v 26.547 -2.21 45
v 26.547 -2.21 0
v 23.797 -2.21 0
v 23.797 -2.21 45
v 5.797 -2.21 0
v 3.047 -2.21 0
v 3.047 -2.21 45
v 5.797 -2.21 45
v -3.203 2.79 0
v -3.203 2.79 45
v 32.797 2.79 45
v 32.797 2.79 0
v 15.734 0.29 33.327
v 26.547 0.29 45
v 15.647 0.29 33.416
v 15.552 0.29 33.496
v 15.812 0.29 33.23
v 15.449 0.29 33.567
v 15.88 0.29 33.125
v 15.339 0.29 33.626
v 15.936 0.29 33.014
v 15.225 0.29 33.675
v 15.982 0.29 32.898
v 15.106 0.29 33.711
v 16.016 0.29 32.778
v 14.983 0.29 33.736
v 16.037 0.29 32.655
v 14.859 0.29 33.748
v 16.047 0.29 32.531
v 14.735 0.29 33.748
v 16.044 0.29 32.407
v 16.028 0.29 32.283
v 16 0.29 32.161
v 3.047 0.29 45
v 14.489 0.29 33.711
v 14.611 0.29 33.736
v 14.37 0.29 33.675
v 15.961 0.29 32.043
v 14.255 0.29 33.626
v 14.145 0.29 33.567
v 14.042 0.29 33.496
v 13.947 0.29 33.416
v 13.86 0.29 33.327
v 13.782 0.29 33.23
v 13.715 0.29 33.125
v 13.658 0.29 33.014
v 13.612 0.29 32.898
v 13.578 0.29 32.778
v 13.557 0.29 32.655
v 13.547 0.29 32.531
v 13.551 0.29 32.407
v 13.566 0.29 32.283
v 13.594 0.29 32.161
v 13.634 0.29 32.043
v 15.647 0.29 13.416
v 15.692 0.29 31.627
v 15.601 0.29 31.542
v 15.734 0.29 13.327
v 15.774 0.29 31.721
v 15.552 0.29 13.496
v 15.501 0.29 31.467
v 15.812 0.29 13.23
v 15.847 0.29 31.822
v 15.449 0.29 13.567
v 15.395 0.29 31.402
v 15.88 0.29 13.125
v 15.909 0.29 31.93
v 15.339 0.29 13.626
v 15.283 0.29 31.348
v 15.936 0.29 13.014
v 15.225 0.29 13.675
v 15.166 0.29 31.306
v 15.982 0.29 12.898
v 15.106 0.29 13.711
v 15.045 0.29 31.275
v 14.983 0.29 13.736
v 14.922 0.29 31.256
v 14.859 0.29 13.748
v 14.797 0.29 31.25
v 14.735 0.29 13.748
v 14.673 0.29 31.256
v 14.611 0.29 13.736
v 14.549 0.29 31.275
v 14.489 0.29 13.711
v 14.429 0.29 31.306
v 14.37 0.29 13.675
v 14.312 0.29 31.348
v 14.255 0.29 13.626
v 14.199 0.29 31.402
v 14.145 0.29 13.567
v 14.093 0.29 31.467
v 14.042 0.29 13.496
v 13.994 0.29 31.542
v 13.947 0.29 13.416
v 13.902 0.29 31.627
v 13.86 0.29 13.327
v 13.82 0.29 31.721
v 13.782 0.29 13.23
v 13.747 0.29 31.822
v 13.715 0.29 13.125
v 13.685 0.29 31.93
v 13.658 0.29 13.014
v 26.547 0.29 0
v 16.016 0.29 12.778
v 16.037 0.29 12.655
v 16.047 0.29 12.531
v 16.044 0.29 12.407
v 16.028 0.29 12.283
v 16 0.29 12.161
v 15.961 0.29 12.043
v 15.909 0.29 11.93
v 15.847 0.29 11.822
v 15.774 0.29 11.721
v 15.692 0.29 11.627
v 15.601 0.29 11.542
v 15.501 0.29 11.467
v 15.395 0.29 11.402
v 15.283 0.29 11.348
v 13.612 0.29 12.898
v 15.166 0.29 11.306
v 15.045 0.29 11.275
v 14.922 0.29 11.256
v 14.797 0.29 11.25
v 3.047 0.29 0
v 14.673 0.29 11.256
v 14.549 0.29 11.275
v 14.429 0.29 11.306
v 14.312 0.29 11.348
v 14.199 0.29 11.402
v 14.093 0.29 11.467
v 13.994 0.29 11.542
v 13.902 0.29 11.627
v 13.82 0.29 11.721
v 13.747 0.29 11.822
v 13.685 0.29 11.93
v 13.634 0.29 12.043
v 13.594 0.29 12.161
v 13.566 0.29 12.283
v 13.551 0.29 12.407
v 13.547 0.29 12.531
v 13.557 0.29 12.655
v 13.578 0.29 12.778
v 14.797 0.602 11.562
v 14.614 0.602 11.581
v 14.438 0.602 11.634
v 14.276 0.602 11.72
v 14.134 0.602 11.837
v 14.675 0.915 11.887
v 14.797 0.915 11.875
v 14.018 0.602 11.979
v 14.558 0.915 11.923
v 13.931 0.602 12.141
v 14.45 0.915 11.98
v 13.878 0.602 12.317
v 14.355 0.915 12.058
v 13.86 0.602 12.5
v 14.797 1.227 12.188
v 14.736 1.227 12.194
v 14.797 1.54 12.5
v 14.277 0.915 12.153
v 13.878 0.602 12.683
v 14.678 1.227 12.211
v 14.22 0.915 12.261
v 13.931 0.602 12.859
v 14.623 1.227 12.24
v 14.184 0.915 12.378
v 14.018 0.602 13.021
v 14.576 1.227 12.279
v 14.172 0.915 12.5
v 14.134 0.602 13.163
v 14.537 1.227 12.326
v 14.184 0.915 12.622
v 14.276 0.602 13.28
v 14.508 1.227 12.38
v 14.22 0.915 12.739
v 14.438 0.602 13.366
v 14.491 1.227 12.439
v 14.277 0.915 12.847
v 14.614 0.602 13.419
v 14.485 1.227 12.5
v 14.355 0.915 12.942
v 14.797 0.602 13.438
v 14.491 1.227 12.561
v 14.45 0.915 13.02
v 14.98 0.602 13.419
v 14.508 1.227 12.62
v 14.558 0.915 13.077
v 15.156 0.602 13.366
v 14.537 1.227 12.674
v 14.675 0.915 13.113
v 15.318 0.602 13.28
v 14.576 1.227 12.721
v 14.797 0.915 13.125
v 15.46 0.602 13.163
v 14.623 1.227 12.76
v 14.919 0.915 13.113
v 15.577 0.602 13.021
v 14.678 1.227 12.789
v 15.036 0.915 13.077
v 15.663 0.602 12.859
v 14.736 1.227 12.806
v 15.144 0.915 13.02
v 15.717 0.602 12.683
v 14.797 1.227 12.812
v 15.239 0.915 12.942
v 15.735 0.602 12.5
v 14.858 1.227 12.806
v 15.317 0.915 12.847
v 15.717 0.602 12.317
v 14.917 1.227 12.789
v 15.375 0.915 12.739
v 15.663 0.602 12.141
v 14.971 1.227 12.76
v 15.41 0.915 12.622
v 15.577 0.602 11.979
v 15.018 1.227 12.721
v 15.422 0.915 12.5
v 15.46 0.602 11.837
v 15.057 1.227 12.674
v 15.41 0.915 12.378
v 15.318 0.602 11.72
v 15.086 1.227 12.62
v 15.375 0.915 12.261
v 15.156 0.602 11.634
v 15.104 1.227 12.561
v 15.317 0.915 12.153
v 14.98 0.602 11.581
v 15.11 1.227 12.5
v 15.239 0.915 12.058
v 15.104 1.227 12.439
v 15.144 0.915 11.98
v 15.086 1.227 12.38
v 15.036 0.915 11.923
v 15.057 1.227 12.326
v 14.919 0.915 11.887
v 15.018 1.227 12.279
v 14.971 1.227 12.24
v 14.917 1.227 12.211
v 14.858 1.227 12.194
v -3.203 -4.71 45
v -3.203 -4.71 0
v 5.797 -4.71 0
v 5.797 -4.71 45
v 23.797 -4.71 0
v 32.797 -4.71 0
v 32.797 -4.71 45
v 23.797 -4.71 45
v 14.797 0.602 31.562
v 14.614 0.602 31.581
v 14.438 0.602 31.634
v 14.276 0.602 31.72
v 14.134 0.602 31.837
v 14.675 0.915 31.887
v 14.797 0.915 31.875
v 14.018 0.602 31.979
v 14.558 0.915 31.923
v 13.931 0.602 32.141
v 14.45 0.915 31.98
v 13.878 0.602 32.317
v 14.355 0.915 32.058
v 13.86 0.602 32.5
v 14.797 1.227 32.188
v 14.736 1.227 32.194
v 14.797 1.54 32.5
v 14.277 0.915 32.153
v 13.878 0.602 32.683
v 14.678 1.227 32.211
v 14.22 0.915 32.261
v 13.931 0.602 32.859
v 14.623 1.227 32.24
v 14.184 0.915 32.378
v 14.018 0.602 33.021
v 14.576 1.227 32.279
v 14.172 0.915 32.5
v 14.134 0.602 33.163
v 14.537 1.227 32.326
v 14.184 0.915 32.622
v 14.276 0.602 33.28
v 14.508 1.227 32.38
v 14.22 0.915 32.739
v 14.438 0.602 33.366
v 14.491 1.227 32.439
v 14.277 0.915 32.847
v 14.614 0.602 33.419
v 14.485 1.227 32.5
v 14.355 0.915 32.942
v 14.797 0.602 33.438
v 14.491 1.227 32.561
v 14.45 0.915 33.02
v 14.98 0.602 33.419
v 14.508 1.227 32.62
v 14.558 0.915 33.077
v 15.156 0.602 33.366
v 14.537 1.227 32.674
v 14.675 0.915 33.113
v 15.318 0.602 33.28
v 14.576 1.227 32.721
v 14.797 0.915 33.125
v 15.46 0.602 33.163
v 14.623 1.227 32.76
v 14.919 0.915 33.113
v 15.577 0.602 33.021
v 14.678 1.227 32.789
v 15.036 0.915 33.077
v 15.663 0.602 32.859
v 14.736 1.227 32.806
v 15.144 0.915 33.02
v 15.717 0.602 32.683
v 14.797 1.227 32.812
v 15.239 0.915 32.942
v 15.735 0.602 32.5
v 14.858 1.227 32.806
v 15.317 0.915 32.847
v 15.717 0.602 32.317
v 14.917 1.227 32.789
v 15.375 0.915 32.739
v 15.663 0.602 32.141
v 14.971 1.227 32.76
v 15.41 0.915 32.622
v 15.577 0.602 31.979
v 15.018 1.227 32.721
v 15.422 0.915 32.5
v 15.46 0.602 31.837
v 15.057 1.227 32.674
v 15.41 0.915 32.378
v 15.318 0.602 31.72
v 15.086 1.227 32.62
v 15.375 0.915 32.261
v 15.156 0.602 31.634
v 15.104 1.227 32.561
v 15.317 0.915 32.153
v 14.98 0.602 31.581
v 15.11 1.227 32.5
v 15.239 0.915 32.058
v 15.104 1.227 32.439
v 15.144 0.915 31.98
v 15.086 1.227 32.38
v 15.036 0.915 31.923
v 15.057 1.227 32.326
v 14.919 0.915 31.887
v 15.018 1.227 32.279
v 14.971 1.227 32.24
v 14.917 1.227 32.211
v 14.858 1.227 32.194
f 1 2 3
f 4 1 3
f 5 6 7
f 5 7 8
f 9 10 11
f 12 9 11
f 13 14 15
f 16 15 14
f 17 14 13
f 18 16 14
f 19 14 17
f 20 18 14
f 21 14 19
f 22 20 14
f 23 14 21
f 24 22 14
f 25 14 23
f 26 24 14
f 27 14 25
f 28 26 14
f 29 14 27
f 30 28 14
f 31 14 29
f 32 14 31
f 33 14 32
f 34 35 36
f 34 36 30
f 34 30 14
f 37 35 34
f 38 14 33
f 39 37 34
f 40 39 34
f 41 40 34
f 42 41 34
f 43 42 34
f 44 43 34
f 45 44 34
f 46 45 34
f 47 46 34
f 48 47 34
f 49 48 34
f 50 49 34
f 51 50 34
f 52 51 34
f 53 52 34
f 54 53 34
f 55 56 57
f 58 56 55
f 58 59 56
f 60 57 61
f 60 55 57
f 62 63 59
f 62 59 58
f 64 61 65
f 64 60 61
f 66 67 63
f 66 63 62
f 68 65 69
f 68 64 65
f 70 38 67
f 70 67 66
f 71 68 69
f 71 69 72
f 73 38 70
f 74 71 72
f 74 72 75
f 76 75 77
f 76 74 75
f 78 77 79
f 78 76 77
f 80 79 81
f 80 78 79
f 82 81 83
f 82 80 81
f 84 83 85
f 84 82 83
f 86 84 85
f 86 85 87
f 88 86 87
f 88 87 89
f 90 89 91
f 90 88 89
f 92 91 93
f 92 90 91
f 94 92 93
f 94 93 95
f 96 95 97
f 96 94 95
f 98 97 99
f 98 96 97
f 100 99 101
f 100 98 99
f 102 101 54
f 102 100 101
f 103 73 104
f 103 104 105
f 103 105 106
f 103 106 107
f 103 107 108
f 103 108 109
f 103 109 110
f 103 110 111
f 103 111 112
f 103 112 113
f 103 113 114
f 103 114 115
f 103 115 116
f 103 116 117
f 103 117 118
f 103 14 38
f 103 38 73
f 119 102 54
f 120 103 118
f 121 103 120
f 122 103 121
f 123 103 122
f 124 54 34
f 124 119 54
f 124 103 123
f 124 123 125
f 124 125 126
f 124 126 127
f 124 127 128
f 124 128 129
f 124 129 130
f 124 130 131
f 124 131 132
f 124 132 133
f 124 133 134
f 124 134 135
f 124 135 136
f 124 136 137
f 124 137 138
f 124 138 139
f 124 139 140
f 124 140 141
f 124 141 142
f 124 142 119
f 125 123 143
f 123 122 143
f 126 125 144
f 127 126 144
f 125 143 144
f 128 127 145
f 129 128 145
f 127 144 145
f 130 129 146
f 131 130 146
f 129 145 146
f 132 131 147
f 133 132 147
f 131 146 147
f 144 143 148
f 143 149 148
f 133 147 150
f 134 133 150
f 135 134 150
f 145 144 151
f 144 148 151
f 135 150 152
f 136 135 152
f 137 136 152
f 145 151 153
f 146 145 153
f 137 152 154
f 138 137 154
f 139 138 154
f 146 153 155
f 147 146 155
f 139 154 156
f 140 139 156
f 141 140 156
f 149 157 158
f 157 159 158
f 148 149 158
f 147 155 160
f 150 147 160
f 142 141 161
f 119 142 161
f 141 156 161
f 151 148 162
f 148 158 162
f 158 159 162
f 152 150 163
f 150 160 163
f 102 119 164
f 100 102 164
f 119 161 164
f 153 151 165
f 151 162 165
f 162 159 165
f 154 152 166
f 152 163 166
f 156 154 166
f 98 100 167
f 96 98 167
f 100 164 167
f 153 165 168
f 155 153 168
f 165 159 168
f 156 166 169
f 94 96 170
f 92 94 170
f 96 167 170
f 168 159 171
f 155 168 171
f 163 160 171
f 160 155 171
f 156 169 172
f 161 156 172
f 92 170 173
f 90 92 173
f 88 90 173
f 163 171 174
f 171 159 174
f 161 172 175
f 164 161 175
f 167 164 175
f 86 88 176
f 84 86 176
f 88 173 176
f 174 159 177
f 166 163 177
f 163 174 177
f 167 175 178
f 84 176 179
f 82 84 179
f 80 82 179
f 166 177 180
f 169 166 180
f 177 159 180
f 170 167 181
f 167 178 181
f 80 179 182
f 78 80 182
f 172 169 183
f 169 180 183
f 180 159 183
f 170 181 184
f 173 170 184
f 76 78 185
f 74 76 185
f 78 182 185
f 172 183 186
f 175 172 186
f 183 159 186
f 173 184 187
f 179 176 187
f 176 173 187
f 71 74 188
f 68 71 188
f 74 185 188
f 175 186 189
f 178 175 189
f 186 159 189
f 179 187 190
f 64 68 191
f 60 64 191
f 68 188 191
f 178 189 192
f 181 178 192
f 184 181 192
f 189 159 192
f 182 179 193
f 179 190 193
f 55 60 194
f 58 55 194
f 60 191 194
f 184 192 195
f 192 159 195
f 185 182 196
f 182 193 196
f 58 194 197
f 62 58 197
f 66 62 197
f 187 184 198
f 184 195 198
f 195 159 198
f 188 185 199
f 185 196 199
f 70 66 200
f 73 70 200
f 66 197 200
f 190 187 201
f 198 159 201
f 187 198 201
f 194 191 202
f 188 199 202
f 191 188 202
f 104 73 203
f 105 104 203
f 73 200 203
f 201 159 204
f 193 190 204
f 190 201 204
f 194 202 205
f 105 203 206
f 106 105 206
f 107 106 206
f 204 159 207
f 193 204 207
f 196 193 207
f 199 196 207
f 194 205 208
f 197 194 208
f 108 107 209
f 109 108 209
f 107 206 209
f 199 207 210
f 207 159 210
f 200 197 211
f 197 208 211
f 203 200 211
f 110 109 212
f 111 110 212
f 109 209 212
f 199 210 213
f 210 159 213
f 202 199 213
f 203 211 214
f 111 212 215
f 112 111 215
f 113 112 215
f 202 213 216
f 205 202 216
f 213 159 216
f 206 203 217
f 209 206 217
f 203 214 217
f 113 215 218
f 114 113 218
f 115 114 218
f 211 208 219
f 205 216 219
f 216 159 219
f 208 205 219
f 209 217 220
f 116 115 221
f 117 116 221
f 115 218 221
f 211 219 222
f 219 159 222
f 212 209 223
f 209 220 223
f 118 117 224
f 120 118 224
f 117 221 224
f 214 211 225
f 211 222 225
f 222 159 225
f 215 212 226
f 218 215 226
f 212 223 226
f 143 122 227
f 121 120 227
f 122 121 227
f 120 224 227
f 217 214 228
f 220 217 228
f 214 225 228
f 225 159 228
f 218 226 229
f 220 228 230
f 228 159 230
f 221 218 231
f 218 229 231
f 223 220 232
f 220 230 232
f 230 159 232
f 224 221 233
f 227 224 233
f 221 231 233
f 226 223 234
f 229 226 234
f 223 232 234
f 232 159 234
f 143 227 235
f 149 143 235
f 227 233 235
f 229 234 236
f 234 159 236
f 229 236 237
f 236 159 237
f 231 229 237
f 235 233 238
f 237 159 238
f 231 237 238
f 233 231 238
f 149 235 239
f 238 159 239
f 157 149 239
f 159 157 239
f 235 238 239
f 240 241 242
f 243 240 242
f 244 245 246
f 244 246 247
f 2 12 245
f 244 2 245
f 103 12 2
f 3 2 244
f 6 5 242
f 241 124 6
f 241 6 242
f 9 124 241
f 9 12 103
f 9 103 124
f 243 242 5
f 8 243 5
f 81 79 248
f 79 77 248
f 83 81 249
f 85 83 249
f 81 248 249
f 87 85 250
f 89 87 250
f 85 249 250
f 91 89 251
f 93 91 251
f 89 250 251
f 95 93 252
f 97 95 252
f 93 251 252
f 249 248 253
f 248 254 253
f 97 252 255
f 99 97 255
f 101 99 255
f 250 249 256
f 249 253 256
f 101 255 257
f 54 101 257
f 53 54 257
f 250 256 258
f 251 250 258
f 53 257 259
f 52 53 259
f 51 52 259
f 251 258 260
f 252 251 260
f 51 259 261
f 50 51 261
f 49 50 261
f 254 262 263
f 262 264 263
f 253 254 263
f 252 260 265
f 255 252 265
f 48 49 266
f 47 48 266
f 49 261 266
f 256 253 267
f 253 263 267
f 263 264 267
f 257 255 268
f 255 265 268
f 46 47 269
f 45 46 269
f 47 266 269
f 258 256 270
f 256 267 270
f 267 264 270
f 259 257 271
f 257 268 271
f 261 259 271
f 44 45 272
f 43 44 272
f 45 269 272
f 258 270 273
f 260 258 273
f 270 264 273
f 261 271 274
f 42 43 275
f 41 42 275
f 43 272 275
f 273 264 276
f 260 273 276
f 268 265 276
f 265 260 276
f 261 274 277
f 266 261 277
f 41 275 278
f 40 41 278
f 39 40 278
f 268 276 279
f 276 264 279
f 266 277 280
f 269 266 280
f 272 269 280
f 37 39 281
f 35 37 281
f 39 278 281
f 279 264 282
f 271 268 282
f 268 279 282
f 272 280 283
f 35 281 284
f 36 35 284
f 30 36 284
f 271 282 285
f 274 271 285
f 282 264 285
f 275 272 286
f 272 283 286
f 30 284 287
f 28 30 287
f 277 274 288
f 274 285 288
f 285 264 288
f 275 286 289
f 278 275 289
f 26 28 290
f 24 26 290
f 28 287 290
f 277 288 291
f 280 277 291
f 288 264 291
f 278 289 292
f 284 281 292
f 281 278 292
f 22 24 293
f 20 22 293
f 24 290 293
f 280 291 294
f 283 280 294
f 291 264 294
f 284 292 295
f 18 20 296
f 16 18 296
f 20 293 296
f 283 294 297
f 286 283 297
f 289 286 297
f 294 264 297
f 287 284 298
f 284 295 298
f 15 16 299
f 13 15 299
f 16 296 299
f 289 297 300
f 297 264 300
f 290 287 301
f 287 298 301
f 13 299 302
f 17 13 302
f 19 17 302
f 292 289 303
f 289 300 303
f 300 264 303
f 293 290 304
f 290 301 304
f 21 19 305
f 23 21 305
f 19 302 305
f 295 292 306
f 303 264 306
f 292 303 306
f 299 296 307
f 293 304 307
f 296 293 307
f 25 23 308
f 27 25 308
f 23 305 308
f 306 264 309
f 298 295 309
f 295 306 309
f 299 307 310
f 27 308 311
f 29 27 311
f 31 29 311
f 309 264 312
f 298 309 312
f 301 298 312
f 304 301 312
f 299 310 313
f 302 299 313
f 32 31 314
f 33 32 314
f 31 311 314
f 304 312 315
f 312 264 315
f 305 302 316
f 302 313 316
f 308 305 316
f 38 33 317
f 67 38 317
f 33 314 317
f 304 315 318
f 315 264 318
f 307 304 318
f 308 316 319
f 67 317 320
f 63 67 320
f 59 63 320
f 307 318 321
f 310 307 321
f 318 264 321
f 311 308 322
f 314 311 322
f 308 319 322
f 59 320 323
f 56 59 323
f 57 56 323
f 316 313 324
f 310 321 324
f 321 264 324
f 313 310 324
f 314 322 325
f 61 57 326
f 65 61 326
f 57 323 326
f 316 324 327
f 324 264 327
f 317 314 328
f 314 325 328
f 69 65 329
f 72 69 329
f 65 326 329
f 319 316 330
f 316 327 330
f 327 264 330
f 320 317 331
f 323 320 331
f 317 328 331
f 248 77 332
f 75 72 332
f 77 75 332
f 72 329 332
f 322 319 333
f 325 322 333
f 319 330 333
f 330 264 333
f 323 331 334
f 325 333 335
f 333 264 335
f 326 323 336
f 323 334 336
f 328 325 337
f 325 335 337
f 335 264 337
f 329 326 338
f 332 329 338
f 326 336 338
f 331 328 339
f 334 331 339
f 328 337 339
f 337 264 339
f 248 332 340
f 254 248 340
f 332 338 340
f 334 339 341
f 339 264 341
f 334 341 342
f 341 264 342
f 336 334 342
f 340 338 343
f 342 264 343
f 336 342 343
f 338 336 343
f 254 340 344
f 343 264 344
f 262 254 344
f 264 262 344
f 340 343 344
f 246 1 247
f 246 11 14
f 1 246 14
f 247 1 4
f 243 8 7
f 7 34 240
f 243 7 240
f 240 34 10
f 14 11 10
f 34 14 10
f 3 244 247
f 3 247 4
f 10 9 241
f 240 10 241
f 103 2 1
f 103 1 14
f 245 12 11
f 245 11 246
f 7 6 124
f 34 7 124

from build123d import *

# Parameters (mm, degrees)
SKETCH1_W           = 6.25
SKETCH1_H           = 2.5
SKETCH1_W_2         = 9
BOSS_EXTRUDE1_DEPTH = 45


with BuildPart() as part:
    # Sketch1 → Boss-Extrude1 (new body)
    with BuildSketch(Plane.XY):
        Polygon((-3.202898551, 2.789855072), (-3.202898551, 0.289855072), (3.047101449, 0.289855072), (14.797101449, 0.289855072), (14.797101449, 2.789855072), align=None)
        with Locations((-0.077898551, -0.960144928)):
            Rectangle(SKETCH1_W, SKETCH1_H)
        with Locations((1.297101449, -3.460144928)):
            Rectangle(SKETCH1_W_2, SKETCH1_H)
    boss_extrude1 = extrude(amount=BOSS_EXTRUDE1_DEPTH)

    # Mirror1: Boss-Extrude1 across plane
    add(boss_extrude1.mirror(Plane(origin=(14.797101449, 0, 45), x_dir=(0, 0, 1), z_dir=(-1, 0, 0))))

    # Cut-Extrude1 cone 1 section (through the dimple's axis) → Cut-Extrude1 (revolve, cut)
    with BuildSketch(Plane(origin=(14.797101449, 0.289855072, 32.5), x_dir=(0, 0, -1), z_dir=(1, 0, 0))):
        Polygon((0, 0), (1.25, 0), (0, 1.25), align=None)
    revolve(axis=Axis((14.797101449, 0.289855072, 32.5), (0, 1, 0)), mode=Mode.SUBTRACT)

    # Cut-Extrude1 cone 2 section (through the dimple's axis) → Cut-Extrude1 cone 2 (revolve, cut)
    with BuildSketch(Plane(origin=(14.797101449, 0.289855072, 12.5), x_dir=(0, 0, -1), z_dir=(1, 0, 0))):
        Polygon((0, 0), (1.25, 0), (0, 1.25), align=None)
    revolve(axis=Axis((14.797101449, 0.289855072, 12.5), (0, 1, 0)), mode=Mode.SUBTRACT)


solid = part.part
